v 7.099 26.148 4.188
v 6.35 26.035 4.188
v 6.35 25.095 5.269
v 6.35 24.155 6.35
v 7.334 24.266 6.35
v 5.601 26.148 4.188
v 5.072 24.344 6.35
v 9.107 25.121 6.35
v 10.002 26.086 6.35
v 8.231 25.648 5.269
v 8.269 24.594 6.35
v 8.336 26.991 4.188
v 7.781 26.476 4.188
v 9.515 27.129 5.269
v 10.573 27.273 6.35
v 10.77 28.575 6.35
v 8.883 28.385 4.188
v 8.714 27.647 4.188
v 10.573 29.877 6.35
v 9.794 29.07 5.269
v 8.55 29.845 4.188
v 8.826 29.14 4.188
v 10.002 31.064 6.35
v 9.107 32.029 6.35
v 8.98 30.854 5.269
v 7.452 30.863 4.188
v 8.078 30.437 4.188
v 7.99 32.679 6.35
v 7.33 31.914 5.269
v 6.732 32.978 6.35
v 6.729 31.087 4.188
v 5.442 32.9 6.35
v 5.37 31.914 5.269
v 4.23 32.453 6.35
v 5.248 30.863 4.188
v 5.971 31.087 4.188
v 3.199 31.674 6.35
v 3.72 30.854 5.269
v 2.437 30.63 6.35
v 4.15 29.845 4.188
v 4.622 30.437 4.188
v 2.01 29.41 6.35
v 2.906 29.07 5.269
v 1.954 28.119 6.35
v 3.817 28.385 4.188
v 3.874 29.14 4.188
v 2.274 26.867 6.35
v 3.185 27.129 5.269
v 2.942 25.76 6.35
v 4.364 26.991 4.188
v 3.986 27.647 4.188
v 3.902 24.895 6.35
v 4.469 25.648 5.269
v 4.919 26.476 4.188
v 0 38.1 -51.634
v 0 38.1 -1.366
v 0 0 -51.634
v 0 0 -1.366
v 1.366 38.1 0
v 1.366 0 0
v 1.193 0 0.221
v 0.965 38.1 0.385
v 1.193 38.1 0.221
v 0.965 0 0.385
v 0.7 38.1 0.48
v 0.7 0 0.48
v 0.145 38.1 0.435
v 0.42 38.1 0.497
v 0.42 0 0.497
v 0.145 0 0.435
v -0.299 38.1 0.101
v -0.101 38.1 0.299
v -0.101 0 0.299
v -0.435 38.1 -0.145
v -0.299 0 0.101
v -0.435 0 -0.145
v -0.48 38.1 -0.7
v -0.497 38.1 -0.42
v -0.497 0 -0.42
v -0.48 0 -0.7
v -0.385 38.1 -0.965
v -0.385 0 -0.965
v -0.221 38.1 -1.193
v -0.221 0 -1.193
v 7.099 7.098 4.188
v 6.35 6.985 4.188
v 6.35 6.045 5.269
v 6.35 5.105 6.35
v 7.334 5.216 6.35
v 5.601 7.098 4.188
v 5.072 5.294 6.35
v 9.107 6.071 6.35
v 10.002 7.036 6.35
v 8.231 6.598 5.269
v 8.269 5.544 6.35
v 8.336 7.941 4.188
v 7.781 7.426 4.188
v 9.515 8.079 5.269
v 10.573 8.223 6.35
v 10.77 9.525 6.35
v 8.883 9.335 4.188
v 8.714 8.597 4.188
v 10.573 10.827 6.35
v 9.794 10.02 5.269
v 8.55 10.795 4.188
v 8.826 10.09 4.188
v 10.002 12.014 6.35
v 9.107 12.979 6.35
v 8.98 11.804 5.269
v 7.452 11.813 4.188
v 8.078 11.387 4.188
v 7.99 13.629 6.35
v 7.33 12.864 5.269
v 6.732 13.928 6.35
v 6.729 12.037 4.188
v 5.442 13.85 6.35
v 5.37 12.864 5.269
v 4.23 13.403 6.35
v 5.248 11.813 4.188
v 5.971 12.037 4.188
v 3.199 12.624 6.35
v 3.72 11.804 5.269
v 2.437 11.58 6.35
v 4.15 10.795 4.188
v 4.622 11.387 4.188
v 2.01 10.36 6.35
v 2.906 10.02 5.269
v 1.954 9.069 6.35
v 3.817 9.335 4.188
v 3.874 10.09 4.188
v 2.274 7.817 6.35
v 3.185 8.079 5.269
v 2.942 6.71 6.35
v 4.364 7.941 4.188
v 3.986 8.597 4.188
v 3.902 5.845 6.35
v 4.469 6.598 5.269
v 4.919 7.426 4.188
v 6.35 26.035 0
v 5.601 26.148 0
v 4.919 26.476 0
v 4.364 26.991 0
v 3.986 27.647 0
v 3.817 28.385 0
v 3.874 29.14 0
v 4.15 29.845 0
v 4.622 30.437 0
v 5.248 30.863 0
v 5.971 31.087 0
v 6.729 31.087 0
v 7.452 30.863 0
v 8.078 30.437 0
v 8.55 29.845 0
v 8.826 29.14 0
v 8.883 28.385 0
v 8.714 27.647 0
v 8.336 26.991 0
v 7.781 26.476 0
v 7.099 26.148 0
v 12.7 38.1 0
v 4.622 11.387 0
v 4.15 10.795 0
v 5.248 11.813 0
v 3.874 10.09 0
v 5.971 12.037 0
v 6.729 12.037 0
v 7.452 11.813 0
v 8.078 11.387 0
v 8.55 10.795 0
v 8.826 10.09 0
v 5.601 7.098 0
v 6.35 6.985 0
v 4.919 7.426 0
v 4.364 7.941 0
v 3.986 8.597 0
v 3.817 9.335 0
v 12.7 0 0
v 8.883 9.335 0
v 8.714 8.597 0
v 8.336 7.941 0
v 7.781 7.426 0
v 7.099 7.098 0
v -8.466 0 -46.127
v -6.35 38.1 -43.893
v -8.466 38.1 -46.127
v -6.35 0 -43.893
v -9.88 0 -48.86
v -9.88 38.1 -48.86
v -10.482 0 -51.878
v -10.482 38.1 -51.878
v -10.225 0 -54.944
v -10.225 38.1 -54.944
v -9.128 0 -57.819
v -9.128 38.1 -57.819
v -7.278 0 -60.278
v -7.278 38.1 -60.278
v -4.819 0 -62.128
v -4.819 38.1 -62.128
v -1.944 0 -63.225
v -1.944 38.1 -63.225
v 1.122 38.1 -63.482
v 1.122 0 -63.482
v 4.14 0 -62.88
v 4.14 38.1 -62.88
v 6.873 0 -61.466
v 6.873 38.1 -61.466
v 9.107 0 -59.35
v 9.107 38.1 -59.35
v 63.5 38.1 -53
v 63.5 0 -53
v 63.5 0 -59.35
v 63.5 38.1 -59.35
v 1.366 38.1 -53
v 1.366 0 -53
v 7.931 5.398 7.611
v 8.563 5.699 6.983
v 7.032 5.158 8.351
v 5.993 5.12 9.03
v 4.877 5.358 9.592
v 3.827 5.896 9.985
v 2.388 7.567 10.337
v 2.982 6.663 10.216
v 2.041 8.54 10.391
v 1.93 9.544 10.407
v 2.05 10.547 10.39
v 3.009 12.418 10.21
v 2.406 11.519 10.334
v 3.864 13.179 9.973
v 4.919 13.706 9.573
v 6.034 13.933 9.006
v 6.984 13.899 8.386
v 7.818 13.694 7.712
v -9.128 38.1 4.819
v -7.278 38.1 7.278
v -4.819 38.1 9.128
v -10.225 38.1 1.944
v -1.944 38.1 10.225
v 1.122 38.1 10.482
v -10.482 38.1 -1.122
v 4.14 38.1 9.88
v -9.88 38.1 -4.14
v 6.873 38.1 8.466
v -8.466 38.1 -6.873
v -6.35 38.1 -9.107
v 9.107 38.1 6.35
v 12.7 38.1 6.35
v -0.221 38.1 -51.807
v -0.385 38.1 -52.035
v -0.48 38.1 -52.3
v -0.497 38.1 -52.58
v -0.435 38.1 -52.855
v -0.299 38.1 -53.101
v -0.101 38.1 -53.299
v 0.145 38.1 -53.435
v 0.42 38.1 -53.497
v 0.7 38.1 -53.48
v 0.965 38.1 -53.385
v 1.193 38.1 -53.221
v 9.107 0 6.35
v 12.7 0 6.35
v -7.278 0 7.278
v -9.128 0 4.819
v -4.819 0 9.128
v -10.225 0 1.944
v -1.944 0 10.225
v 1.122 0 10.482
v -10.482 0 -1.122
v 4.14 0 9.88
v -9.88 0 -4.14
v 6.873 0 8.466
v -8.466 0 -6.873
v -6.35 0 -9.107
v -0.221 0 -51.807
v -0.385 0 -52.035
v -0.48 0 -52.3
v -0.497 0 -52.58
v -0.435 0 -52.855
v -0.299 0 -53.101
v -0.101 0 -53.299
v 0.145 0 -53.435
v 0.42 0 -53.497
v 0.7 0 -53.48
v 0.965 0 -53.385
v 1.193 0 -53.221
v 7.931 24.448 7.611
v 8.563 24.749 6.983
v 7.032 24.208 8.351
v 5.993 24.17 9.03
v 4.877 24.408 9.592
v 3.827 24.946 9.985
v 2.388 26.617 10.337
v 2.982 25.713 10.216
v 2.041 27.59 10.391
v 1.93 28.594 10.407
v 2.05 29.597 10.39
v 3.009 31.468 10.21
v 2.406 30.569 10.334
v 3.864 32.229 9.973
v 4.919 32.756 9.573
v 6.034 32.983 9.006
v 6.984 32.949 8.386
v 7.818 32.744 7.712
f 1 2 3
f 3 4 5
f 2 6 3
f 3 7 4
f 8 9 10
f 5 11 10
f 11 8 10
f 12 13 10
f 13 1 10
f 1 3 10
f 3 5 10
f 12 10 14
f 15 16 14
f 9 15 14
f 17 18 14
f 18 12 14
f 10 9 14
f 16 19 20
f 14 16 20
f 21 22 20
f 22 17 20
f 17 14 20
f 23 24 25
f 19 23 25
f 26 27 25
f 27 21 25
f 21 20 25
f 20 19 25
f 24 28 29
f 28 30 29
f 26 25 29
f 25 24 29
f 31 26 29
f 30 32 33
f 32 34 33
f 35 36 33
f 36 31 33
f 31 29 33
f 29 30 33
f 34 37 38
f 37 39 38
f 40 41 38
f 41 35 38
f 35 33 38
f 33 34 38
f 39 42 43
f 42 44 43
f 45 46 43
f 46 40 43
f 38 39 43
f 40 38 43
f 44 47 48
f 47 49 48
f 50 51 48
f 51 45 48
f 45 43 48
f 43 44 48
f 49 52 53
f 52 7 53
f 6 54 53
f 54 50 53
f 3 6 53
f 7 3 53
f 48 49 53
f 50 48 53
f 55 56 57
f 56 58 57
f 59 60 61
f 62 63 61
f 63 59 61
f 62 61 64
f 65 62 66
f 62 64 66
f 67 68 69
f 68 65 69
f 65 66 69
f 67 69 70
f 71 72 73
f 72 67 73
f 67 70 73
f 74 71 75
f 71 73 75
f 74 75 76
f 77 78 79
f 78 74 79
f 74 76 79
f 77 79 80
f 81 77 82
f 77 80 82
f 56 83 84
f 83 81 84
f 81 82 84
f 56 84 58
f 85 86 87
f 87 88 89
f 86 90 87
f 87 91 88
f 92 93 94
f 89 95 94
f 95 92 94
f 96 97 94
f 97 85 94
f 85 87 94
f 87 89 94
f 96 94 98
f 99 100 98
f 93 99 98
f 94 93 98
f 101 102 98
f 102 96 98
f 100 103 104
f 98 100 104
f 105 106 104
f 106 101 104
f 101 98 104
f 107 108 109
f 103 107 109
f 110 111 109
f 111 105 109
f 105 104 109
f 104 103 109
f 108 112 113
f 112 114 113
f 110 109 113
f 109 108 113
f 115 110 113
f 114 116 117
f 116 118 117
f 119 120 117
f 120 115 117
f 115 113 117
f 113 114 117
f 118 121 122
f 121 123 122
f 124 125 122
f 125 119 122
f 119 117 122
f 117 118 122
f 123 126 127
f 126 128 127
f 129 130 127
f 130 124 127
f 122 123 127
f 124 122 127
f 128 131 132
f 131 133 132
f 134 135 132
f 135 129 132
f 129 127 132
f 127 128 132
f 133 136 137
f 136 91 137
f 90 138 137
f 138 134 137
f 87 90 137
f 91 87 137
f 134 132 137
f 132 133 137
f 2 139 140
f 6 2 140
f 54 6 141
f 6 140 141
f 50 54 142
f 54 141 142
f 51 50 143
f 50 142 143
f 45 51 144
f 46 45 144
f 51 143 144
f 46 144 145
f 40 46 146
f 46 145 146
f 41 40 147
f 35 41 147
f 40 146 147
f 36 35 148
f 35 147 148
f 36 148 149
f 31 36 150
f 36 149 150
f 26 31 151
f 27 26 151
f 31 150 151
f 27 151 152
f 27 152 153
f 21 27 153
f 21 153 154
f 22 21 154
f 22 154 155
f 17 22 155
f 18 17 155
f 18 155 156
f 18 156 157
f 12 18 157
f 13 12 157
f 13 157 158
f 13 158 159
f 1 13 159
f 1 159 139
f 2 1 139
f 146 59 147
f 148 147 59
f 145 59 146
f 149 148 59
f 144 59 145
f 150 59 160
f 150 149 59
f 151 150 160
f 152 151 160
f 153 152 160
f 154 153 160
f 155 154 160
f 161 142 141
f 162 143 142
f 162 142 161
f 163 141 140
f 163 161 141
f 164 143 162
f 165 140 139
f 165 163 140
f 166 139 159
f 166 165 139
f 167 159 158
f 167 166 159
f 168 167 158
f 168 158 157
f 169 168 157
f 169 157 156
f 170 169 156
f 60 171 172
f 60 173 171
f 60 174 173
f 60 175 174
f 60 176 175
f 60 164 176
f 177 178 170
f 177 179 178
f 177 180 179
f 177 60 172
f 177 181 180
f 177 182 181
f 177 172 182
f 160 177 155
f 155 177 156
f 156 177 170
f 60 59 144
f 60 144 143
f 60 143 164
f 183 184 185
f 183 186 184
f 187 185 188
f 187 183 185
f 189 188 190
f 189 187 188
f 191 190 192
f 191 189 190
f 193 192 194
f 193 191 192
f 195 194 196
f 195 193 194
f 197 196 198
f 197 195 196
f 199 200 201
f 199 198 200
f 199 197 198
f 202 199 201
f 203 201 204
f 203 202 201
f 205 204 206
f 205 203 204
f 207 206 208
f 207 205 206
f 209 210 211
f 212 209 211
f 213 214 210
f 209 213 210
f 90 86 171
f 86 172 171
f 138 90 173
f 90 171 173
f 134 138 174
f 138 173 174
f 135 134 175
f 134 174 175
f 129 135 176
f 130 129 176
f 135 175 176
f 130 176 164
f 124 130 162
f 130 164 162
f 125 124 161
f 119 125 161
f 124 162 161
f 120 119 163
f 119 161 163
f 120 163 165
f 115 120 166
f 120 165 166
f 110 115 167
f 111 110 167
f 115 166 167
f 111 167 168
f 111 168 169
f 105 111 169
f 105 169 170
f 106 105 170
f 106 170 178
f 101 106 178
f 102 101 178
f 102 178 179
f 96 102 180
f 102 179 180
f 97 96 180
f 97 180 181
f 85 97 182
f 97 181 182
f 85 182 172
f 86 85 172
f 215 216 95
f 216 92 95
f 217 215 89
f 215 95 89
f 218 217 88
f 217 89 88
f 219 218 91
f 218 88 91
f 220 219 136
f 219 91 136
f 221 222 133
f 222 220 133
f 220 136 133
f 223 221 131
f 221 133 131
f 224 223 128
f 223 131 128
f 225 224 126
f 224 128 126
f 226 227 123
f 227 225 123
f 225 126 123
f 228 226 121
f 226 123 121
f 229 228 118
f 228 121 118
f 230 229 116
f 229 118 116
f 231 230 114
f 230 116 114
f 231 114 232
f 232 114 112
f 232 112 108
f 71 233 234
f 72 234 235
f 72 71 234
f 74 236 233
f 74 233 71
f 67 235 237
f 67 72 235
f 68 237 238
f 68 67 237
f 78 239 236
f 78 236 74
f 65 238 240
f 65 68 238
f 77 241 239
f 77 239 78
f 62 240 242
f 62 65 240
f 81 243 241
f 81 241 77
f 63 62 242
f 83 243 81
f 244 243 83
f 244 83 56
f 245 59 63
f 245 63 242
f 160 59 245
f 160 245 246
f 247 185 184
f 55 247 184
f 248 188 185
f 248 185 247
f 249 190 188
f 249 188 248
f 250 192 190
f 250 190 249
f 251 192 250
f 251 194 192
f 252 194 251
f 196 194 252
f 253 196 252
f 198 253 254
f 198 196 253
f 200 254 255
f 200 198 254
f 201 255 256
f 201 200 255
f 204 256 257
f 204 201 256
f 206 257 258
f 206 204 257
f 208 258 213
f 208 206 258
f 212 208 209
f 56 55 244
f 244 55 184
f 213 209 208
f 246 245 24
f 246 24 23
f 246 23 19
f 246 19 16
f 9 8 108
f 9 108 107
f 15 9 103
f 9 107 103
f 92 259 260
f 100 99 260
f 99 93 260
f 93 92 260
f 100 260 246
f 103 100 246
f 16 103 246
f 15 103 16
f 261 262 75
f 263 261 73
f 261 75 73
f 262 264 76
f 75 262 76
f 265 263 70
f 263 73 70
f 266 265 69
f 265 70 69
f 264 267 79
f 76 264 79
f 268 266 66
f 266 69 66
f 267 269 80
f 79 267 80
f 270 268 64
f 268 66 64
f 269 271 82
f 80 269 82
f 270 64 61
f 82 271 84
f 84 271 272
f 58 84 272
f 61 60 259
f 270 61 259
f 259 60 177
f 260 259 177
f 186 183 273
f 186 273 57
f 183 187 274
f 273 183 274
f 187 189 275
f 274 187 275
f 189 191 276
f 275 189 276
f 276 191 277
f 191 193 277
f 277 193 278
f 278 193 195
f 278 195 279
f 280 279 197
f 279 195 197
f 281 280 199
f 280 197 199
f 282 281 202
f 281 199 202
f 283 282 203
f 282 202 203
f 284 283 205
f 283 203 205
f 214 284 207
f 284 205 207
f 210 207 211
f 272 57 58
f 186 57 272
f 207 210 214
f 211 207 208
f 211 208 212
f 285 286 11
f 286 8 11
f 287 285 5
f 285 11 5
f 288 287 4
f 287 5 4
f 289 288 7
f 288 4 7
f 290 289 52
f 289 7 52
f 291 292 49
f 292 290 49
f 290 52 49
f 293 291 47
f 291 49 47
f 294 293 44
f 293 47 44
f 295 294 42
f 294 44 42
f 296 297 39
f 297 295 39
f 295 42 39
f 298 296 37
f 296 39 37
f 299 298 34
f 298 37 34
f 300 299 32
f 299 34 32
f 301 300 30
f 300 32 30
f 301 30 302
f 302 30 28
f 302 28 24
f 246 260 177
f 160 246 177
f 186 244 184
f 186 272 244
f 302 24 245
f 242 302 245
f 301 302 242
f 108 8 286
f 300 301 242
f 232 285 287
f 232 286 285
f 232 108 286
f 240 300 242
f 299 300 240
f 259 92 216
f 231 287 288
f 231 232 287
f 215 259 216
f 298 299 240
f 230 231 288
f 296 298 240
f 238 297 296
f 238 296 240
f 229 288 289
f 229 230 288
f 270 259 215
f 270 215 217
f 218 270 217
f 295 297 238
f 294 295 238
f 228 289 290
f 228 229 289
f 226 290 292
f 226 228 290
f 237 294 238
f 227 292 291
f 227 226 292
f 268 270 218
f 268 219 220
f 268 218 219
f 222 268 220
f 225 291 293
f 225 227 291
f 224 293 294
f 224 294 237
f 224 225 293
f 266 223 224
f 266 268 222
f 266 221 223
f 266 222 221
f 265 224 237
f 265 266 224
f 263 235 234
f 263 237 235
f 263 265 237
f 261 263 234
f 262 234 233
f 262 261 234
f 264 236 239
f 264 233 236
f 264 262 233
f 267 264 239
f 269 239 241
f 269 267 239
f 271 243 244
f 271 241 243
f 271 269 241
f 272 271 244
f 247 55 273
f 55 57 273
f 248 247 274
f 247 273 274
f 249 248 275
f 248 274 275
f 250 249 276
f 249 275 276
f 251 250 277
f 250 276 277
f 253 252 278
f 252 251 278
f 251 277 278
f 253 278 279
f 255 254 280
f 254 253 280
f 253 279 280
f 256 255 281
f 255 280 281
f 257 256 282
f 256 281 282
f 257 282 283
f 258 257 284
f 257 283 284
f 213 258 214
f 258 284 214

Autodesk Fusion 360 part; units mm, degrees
sketch "Sketch1" plane through (0, 0, 0) normal (0, 1, 0) x (1, 0, 0)
  line L0 (0, 0) -> (0, 53)
  line L1 (0, 0) -> (12.7, 0)
  line L2 (0, 53) -> (63.5, 53)
  line L3 (-6.35, 59.35) -> (63.5, 59.35)
  line L4 (-6.35, -6.35) -> (-6.35, 59.35)
  line L5 (-6.35, -6.35) -> (12.7, -6.35)
  line L6 (12.7, -6.35) -> (12.7, 0)
  line L7 (63.5, 53) -> (63.5, 59.35)
  line L8 (-6.35, -6.35) -> (0.5, 0.5) construction
  line L9 (-6.35, 59.35) -> (0.5, 52.5) construction
  dimension "d1" = 53
  dimension "d2" = 12.7
  dimension "d3" = 63.5
  dimension "d5" = 6.35
  dimension "d6" = 0.5
  dimension "d7" = 0.5
sketch "Sketch2" plane through (0, 0, 0) normal (0, 1, 0) x (1, 0, 0)
  circle A0 centre (0.5, 0.5) radius 1
  circle A1 centre (0.5, 52.5) radius 1
  circle A2 centre (0.5, 52.5) radius 11
  line L0 (-6.35, -6.35) -> (-6.35, 59.35)
  line L1 (-6.35, 59.35) -> (63.5, 59.35)
  line L2 (-6.35, -6.35) -> (12.7, -6.35)
  circle A3 centre (0.5, 0.5) radius 11
  point P0 (0.5, 0.5)
  point P1 (0.5, 52.5)
  dimension "d8" = 2
  dimension "d9" = 22
ref_plane "WorkPlane1" through (0, 0, 6.35) normal (0, 0, 1) x (1, 0, 0)
sketch "Sketch3" plane through (0, 0, 6.35) normal (0, 0, 1) x (1, 0, 0)
  line L0 (-6.35, 0) -> (12.7, 0)
  line L1 (-6.35, 0) -> (12.7, 0) construction
  line L2 (12.7, 0) -> (12.7, 38.1)
  line L3 (12.7, 38.1) -> (-6.35, 38.1)
  line L4 (-6.35, 38.1) -> (-6.35, 0)
  line L5 (6.35, 0) -> (6.35, 38.1) construction
  line L6 (12.7, 19.05) -> (6.35, 19.05) construction
  circle A0 centre (6.35, 28.575) radius 4.4196
  circle A1 centre (6.35, 9.525) radius 4.4196
  line L7 (0, 0) -> (12.7, 0)
  point P0 (6.35, 9.525)
  point P1 (6.35, 28.575)
  dimension "d11" = 38.1
  dimension "d12" = 19.05
  dimension "d13" = 8.8392
extrude "Extrude1" add sketch "Sketch1" along normal up to surface (38.1 mm away)
extrude "Extrude2" add sketch "Sketch2" along normal up to surface (38.1 mm away) contours L0 L2 A3 | A2 L0 L1 picked at (-6.7442, 3.5907) picked at (-6.7442, 49.4093)
extrude "Extrude3" cut sketch "Sketch3" along normal blind 5 contours A0 | A1
hole "Hole1" at (6.35, 28.575, 6.35) at (6.35, 9.525, 6.35) direction (0, 0, -1) diameter 5.08 depth 25 tip angle 118 countersink diameter 8.8392 countersink angle 82
extrude "Extrude4" cut sketch "Sketch2" along normal up to surface (38.1 mm away) contours A0 | A1
equation "d2 = ( 0.5 * 25.4 ) * 1 mm"
equation "d3 = ( 2.5 * 25.4 ) * 1 mm"
equation "d11 = ( 1.5 * 25.4 ) * 1 mm"
equation "d12 = ( 0.75 * 25.4 ) * 1 mm"
